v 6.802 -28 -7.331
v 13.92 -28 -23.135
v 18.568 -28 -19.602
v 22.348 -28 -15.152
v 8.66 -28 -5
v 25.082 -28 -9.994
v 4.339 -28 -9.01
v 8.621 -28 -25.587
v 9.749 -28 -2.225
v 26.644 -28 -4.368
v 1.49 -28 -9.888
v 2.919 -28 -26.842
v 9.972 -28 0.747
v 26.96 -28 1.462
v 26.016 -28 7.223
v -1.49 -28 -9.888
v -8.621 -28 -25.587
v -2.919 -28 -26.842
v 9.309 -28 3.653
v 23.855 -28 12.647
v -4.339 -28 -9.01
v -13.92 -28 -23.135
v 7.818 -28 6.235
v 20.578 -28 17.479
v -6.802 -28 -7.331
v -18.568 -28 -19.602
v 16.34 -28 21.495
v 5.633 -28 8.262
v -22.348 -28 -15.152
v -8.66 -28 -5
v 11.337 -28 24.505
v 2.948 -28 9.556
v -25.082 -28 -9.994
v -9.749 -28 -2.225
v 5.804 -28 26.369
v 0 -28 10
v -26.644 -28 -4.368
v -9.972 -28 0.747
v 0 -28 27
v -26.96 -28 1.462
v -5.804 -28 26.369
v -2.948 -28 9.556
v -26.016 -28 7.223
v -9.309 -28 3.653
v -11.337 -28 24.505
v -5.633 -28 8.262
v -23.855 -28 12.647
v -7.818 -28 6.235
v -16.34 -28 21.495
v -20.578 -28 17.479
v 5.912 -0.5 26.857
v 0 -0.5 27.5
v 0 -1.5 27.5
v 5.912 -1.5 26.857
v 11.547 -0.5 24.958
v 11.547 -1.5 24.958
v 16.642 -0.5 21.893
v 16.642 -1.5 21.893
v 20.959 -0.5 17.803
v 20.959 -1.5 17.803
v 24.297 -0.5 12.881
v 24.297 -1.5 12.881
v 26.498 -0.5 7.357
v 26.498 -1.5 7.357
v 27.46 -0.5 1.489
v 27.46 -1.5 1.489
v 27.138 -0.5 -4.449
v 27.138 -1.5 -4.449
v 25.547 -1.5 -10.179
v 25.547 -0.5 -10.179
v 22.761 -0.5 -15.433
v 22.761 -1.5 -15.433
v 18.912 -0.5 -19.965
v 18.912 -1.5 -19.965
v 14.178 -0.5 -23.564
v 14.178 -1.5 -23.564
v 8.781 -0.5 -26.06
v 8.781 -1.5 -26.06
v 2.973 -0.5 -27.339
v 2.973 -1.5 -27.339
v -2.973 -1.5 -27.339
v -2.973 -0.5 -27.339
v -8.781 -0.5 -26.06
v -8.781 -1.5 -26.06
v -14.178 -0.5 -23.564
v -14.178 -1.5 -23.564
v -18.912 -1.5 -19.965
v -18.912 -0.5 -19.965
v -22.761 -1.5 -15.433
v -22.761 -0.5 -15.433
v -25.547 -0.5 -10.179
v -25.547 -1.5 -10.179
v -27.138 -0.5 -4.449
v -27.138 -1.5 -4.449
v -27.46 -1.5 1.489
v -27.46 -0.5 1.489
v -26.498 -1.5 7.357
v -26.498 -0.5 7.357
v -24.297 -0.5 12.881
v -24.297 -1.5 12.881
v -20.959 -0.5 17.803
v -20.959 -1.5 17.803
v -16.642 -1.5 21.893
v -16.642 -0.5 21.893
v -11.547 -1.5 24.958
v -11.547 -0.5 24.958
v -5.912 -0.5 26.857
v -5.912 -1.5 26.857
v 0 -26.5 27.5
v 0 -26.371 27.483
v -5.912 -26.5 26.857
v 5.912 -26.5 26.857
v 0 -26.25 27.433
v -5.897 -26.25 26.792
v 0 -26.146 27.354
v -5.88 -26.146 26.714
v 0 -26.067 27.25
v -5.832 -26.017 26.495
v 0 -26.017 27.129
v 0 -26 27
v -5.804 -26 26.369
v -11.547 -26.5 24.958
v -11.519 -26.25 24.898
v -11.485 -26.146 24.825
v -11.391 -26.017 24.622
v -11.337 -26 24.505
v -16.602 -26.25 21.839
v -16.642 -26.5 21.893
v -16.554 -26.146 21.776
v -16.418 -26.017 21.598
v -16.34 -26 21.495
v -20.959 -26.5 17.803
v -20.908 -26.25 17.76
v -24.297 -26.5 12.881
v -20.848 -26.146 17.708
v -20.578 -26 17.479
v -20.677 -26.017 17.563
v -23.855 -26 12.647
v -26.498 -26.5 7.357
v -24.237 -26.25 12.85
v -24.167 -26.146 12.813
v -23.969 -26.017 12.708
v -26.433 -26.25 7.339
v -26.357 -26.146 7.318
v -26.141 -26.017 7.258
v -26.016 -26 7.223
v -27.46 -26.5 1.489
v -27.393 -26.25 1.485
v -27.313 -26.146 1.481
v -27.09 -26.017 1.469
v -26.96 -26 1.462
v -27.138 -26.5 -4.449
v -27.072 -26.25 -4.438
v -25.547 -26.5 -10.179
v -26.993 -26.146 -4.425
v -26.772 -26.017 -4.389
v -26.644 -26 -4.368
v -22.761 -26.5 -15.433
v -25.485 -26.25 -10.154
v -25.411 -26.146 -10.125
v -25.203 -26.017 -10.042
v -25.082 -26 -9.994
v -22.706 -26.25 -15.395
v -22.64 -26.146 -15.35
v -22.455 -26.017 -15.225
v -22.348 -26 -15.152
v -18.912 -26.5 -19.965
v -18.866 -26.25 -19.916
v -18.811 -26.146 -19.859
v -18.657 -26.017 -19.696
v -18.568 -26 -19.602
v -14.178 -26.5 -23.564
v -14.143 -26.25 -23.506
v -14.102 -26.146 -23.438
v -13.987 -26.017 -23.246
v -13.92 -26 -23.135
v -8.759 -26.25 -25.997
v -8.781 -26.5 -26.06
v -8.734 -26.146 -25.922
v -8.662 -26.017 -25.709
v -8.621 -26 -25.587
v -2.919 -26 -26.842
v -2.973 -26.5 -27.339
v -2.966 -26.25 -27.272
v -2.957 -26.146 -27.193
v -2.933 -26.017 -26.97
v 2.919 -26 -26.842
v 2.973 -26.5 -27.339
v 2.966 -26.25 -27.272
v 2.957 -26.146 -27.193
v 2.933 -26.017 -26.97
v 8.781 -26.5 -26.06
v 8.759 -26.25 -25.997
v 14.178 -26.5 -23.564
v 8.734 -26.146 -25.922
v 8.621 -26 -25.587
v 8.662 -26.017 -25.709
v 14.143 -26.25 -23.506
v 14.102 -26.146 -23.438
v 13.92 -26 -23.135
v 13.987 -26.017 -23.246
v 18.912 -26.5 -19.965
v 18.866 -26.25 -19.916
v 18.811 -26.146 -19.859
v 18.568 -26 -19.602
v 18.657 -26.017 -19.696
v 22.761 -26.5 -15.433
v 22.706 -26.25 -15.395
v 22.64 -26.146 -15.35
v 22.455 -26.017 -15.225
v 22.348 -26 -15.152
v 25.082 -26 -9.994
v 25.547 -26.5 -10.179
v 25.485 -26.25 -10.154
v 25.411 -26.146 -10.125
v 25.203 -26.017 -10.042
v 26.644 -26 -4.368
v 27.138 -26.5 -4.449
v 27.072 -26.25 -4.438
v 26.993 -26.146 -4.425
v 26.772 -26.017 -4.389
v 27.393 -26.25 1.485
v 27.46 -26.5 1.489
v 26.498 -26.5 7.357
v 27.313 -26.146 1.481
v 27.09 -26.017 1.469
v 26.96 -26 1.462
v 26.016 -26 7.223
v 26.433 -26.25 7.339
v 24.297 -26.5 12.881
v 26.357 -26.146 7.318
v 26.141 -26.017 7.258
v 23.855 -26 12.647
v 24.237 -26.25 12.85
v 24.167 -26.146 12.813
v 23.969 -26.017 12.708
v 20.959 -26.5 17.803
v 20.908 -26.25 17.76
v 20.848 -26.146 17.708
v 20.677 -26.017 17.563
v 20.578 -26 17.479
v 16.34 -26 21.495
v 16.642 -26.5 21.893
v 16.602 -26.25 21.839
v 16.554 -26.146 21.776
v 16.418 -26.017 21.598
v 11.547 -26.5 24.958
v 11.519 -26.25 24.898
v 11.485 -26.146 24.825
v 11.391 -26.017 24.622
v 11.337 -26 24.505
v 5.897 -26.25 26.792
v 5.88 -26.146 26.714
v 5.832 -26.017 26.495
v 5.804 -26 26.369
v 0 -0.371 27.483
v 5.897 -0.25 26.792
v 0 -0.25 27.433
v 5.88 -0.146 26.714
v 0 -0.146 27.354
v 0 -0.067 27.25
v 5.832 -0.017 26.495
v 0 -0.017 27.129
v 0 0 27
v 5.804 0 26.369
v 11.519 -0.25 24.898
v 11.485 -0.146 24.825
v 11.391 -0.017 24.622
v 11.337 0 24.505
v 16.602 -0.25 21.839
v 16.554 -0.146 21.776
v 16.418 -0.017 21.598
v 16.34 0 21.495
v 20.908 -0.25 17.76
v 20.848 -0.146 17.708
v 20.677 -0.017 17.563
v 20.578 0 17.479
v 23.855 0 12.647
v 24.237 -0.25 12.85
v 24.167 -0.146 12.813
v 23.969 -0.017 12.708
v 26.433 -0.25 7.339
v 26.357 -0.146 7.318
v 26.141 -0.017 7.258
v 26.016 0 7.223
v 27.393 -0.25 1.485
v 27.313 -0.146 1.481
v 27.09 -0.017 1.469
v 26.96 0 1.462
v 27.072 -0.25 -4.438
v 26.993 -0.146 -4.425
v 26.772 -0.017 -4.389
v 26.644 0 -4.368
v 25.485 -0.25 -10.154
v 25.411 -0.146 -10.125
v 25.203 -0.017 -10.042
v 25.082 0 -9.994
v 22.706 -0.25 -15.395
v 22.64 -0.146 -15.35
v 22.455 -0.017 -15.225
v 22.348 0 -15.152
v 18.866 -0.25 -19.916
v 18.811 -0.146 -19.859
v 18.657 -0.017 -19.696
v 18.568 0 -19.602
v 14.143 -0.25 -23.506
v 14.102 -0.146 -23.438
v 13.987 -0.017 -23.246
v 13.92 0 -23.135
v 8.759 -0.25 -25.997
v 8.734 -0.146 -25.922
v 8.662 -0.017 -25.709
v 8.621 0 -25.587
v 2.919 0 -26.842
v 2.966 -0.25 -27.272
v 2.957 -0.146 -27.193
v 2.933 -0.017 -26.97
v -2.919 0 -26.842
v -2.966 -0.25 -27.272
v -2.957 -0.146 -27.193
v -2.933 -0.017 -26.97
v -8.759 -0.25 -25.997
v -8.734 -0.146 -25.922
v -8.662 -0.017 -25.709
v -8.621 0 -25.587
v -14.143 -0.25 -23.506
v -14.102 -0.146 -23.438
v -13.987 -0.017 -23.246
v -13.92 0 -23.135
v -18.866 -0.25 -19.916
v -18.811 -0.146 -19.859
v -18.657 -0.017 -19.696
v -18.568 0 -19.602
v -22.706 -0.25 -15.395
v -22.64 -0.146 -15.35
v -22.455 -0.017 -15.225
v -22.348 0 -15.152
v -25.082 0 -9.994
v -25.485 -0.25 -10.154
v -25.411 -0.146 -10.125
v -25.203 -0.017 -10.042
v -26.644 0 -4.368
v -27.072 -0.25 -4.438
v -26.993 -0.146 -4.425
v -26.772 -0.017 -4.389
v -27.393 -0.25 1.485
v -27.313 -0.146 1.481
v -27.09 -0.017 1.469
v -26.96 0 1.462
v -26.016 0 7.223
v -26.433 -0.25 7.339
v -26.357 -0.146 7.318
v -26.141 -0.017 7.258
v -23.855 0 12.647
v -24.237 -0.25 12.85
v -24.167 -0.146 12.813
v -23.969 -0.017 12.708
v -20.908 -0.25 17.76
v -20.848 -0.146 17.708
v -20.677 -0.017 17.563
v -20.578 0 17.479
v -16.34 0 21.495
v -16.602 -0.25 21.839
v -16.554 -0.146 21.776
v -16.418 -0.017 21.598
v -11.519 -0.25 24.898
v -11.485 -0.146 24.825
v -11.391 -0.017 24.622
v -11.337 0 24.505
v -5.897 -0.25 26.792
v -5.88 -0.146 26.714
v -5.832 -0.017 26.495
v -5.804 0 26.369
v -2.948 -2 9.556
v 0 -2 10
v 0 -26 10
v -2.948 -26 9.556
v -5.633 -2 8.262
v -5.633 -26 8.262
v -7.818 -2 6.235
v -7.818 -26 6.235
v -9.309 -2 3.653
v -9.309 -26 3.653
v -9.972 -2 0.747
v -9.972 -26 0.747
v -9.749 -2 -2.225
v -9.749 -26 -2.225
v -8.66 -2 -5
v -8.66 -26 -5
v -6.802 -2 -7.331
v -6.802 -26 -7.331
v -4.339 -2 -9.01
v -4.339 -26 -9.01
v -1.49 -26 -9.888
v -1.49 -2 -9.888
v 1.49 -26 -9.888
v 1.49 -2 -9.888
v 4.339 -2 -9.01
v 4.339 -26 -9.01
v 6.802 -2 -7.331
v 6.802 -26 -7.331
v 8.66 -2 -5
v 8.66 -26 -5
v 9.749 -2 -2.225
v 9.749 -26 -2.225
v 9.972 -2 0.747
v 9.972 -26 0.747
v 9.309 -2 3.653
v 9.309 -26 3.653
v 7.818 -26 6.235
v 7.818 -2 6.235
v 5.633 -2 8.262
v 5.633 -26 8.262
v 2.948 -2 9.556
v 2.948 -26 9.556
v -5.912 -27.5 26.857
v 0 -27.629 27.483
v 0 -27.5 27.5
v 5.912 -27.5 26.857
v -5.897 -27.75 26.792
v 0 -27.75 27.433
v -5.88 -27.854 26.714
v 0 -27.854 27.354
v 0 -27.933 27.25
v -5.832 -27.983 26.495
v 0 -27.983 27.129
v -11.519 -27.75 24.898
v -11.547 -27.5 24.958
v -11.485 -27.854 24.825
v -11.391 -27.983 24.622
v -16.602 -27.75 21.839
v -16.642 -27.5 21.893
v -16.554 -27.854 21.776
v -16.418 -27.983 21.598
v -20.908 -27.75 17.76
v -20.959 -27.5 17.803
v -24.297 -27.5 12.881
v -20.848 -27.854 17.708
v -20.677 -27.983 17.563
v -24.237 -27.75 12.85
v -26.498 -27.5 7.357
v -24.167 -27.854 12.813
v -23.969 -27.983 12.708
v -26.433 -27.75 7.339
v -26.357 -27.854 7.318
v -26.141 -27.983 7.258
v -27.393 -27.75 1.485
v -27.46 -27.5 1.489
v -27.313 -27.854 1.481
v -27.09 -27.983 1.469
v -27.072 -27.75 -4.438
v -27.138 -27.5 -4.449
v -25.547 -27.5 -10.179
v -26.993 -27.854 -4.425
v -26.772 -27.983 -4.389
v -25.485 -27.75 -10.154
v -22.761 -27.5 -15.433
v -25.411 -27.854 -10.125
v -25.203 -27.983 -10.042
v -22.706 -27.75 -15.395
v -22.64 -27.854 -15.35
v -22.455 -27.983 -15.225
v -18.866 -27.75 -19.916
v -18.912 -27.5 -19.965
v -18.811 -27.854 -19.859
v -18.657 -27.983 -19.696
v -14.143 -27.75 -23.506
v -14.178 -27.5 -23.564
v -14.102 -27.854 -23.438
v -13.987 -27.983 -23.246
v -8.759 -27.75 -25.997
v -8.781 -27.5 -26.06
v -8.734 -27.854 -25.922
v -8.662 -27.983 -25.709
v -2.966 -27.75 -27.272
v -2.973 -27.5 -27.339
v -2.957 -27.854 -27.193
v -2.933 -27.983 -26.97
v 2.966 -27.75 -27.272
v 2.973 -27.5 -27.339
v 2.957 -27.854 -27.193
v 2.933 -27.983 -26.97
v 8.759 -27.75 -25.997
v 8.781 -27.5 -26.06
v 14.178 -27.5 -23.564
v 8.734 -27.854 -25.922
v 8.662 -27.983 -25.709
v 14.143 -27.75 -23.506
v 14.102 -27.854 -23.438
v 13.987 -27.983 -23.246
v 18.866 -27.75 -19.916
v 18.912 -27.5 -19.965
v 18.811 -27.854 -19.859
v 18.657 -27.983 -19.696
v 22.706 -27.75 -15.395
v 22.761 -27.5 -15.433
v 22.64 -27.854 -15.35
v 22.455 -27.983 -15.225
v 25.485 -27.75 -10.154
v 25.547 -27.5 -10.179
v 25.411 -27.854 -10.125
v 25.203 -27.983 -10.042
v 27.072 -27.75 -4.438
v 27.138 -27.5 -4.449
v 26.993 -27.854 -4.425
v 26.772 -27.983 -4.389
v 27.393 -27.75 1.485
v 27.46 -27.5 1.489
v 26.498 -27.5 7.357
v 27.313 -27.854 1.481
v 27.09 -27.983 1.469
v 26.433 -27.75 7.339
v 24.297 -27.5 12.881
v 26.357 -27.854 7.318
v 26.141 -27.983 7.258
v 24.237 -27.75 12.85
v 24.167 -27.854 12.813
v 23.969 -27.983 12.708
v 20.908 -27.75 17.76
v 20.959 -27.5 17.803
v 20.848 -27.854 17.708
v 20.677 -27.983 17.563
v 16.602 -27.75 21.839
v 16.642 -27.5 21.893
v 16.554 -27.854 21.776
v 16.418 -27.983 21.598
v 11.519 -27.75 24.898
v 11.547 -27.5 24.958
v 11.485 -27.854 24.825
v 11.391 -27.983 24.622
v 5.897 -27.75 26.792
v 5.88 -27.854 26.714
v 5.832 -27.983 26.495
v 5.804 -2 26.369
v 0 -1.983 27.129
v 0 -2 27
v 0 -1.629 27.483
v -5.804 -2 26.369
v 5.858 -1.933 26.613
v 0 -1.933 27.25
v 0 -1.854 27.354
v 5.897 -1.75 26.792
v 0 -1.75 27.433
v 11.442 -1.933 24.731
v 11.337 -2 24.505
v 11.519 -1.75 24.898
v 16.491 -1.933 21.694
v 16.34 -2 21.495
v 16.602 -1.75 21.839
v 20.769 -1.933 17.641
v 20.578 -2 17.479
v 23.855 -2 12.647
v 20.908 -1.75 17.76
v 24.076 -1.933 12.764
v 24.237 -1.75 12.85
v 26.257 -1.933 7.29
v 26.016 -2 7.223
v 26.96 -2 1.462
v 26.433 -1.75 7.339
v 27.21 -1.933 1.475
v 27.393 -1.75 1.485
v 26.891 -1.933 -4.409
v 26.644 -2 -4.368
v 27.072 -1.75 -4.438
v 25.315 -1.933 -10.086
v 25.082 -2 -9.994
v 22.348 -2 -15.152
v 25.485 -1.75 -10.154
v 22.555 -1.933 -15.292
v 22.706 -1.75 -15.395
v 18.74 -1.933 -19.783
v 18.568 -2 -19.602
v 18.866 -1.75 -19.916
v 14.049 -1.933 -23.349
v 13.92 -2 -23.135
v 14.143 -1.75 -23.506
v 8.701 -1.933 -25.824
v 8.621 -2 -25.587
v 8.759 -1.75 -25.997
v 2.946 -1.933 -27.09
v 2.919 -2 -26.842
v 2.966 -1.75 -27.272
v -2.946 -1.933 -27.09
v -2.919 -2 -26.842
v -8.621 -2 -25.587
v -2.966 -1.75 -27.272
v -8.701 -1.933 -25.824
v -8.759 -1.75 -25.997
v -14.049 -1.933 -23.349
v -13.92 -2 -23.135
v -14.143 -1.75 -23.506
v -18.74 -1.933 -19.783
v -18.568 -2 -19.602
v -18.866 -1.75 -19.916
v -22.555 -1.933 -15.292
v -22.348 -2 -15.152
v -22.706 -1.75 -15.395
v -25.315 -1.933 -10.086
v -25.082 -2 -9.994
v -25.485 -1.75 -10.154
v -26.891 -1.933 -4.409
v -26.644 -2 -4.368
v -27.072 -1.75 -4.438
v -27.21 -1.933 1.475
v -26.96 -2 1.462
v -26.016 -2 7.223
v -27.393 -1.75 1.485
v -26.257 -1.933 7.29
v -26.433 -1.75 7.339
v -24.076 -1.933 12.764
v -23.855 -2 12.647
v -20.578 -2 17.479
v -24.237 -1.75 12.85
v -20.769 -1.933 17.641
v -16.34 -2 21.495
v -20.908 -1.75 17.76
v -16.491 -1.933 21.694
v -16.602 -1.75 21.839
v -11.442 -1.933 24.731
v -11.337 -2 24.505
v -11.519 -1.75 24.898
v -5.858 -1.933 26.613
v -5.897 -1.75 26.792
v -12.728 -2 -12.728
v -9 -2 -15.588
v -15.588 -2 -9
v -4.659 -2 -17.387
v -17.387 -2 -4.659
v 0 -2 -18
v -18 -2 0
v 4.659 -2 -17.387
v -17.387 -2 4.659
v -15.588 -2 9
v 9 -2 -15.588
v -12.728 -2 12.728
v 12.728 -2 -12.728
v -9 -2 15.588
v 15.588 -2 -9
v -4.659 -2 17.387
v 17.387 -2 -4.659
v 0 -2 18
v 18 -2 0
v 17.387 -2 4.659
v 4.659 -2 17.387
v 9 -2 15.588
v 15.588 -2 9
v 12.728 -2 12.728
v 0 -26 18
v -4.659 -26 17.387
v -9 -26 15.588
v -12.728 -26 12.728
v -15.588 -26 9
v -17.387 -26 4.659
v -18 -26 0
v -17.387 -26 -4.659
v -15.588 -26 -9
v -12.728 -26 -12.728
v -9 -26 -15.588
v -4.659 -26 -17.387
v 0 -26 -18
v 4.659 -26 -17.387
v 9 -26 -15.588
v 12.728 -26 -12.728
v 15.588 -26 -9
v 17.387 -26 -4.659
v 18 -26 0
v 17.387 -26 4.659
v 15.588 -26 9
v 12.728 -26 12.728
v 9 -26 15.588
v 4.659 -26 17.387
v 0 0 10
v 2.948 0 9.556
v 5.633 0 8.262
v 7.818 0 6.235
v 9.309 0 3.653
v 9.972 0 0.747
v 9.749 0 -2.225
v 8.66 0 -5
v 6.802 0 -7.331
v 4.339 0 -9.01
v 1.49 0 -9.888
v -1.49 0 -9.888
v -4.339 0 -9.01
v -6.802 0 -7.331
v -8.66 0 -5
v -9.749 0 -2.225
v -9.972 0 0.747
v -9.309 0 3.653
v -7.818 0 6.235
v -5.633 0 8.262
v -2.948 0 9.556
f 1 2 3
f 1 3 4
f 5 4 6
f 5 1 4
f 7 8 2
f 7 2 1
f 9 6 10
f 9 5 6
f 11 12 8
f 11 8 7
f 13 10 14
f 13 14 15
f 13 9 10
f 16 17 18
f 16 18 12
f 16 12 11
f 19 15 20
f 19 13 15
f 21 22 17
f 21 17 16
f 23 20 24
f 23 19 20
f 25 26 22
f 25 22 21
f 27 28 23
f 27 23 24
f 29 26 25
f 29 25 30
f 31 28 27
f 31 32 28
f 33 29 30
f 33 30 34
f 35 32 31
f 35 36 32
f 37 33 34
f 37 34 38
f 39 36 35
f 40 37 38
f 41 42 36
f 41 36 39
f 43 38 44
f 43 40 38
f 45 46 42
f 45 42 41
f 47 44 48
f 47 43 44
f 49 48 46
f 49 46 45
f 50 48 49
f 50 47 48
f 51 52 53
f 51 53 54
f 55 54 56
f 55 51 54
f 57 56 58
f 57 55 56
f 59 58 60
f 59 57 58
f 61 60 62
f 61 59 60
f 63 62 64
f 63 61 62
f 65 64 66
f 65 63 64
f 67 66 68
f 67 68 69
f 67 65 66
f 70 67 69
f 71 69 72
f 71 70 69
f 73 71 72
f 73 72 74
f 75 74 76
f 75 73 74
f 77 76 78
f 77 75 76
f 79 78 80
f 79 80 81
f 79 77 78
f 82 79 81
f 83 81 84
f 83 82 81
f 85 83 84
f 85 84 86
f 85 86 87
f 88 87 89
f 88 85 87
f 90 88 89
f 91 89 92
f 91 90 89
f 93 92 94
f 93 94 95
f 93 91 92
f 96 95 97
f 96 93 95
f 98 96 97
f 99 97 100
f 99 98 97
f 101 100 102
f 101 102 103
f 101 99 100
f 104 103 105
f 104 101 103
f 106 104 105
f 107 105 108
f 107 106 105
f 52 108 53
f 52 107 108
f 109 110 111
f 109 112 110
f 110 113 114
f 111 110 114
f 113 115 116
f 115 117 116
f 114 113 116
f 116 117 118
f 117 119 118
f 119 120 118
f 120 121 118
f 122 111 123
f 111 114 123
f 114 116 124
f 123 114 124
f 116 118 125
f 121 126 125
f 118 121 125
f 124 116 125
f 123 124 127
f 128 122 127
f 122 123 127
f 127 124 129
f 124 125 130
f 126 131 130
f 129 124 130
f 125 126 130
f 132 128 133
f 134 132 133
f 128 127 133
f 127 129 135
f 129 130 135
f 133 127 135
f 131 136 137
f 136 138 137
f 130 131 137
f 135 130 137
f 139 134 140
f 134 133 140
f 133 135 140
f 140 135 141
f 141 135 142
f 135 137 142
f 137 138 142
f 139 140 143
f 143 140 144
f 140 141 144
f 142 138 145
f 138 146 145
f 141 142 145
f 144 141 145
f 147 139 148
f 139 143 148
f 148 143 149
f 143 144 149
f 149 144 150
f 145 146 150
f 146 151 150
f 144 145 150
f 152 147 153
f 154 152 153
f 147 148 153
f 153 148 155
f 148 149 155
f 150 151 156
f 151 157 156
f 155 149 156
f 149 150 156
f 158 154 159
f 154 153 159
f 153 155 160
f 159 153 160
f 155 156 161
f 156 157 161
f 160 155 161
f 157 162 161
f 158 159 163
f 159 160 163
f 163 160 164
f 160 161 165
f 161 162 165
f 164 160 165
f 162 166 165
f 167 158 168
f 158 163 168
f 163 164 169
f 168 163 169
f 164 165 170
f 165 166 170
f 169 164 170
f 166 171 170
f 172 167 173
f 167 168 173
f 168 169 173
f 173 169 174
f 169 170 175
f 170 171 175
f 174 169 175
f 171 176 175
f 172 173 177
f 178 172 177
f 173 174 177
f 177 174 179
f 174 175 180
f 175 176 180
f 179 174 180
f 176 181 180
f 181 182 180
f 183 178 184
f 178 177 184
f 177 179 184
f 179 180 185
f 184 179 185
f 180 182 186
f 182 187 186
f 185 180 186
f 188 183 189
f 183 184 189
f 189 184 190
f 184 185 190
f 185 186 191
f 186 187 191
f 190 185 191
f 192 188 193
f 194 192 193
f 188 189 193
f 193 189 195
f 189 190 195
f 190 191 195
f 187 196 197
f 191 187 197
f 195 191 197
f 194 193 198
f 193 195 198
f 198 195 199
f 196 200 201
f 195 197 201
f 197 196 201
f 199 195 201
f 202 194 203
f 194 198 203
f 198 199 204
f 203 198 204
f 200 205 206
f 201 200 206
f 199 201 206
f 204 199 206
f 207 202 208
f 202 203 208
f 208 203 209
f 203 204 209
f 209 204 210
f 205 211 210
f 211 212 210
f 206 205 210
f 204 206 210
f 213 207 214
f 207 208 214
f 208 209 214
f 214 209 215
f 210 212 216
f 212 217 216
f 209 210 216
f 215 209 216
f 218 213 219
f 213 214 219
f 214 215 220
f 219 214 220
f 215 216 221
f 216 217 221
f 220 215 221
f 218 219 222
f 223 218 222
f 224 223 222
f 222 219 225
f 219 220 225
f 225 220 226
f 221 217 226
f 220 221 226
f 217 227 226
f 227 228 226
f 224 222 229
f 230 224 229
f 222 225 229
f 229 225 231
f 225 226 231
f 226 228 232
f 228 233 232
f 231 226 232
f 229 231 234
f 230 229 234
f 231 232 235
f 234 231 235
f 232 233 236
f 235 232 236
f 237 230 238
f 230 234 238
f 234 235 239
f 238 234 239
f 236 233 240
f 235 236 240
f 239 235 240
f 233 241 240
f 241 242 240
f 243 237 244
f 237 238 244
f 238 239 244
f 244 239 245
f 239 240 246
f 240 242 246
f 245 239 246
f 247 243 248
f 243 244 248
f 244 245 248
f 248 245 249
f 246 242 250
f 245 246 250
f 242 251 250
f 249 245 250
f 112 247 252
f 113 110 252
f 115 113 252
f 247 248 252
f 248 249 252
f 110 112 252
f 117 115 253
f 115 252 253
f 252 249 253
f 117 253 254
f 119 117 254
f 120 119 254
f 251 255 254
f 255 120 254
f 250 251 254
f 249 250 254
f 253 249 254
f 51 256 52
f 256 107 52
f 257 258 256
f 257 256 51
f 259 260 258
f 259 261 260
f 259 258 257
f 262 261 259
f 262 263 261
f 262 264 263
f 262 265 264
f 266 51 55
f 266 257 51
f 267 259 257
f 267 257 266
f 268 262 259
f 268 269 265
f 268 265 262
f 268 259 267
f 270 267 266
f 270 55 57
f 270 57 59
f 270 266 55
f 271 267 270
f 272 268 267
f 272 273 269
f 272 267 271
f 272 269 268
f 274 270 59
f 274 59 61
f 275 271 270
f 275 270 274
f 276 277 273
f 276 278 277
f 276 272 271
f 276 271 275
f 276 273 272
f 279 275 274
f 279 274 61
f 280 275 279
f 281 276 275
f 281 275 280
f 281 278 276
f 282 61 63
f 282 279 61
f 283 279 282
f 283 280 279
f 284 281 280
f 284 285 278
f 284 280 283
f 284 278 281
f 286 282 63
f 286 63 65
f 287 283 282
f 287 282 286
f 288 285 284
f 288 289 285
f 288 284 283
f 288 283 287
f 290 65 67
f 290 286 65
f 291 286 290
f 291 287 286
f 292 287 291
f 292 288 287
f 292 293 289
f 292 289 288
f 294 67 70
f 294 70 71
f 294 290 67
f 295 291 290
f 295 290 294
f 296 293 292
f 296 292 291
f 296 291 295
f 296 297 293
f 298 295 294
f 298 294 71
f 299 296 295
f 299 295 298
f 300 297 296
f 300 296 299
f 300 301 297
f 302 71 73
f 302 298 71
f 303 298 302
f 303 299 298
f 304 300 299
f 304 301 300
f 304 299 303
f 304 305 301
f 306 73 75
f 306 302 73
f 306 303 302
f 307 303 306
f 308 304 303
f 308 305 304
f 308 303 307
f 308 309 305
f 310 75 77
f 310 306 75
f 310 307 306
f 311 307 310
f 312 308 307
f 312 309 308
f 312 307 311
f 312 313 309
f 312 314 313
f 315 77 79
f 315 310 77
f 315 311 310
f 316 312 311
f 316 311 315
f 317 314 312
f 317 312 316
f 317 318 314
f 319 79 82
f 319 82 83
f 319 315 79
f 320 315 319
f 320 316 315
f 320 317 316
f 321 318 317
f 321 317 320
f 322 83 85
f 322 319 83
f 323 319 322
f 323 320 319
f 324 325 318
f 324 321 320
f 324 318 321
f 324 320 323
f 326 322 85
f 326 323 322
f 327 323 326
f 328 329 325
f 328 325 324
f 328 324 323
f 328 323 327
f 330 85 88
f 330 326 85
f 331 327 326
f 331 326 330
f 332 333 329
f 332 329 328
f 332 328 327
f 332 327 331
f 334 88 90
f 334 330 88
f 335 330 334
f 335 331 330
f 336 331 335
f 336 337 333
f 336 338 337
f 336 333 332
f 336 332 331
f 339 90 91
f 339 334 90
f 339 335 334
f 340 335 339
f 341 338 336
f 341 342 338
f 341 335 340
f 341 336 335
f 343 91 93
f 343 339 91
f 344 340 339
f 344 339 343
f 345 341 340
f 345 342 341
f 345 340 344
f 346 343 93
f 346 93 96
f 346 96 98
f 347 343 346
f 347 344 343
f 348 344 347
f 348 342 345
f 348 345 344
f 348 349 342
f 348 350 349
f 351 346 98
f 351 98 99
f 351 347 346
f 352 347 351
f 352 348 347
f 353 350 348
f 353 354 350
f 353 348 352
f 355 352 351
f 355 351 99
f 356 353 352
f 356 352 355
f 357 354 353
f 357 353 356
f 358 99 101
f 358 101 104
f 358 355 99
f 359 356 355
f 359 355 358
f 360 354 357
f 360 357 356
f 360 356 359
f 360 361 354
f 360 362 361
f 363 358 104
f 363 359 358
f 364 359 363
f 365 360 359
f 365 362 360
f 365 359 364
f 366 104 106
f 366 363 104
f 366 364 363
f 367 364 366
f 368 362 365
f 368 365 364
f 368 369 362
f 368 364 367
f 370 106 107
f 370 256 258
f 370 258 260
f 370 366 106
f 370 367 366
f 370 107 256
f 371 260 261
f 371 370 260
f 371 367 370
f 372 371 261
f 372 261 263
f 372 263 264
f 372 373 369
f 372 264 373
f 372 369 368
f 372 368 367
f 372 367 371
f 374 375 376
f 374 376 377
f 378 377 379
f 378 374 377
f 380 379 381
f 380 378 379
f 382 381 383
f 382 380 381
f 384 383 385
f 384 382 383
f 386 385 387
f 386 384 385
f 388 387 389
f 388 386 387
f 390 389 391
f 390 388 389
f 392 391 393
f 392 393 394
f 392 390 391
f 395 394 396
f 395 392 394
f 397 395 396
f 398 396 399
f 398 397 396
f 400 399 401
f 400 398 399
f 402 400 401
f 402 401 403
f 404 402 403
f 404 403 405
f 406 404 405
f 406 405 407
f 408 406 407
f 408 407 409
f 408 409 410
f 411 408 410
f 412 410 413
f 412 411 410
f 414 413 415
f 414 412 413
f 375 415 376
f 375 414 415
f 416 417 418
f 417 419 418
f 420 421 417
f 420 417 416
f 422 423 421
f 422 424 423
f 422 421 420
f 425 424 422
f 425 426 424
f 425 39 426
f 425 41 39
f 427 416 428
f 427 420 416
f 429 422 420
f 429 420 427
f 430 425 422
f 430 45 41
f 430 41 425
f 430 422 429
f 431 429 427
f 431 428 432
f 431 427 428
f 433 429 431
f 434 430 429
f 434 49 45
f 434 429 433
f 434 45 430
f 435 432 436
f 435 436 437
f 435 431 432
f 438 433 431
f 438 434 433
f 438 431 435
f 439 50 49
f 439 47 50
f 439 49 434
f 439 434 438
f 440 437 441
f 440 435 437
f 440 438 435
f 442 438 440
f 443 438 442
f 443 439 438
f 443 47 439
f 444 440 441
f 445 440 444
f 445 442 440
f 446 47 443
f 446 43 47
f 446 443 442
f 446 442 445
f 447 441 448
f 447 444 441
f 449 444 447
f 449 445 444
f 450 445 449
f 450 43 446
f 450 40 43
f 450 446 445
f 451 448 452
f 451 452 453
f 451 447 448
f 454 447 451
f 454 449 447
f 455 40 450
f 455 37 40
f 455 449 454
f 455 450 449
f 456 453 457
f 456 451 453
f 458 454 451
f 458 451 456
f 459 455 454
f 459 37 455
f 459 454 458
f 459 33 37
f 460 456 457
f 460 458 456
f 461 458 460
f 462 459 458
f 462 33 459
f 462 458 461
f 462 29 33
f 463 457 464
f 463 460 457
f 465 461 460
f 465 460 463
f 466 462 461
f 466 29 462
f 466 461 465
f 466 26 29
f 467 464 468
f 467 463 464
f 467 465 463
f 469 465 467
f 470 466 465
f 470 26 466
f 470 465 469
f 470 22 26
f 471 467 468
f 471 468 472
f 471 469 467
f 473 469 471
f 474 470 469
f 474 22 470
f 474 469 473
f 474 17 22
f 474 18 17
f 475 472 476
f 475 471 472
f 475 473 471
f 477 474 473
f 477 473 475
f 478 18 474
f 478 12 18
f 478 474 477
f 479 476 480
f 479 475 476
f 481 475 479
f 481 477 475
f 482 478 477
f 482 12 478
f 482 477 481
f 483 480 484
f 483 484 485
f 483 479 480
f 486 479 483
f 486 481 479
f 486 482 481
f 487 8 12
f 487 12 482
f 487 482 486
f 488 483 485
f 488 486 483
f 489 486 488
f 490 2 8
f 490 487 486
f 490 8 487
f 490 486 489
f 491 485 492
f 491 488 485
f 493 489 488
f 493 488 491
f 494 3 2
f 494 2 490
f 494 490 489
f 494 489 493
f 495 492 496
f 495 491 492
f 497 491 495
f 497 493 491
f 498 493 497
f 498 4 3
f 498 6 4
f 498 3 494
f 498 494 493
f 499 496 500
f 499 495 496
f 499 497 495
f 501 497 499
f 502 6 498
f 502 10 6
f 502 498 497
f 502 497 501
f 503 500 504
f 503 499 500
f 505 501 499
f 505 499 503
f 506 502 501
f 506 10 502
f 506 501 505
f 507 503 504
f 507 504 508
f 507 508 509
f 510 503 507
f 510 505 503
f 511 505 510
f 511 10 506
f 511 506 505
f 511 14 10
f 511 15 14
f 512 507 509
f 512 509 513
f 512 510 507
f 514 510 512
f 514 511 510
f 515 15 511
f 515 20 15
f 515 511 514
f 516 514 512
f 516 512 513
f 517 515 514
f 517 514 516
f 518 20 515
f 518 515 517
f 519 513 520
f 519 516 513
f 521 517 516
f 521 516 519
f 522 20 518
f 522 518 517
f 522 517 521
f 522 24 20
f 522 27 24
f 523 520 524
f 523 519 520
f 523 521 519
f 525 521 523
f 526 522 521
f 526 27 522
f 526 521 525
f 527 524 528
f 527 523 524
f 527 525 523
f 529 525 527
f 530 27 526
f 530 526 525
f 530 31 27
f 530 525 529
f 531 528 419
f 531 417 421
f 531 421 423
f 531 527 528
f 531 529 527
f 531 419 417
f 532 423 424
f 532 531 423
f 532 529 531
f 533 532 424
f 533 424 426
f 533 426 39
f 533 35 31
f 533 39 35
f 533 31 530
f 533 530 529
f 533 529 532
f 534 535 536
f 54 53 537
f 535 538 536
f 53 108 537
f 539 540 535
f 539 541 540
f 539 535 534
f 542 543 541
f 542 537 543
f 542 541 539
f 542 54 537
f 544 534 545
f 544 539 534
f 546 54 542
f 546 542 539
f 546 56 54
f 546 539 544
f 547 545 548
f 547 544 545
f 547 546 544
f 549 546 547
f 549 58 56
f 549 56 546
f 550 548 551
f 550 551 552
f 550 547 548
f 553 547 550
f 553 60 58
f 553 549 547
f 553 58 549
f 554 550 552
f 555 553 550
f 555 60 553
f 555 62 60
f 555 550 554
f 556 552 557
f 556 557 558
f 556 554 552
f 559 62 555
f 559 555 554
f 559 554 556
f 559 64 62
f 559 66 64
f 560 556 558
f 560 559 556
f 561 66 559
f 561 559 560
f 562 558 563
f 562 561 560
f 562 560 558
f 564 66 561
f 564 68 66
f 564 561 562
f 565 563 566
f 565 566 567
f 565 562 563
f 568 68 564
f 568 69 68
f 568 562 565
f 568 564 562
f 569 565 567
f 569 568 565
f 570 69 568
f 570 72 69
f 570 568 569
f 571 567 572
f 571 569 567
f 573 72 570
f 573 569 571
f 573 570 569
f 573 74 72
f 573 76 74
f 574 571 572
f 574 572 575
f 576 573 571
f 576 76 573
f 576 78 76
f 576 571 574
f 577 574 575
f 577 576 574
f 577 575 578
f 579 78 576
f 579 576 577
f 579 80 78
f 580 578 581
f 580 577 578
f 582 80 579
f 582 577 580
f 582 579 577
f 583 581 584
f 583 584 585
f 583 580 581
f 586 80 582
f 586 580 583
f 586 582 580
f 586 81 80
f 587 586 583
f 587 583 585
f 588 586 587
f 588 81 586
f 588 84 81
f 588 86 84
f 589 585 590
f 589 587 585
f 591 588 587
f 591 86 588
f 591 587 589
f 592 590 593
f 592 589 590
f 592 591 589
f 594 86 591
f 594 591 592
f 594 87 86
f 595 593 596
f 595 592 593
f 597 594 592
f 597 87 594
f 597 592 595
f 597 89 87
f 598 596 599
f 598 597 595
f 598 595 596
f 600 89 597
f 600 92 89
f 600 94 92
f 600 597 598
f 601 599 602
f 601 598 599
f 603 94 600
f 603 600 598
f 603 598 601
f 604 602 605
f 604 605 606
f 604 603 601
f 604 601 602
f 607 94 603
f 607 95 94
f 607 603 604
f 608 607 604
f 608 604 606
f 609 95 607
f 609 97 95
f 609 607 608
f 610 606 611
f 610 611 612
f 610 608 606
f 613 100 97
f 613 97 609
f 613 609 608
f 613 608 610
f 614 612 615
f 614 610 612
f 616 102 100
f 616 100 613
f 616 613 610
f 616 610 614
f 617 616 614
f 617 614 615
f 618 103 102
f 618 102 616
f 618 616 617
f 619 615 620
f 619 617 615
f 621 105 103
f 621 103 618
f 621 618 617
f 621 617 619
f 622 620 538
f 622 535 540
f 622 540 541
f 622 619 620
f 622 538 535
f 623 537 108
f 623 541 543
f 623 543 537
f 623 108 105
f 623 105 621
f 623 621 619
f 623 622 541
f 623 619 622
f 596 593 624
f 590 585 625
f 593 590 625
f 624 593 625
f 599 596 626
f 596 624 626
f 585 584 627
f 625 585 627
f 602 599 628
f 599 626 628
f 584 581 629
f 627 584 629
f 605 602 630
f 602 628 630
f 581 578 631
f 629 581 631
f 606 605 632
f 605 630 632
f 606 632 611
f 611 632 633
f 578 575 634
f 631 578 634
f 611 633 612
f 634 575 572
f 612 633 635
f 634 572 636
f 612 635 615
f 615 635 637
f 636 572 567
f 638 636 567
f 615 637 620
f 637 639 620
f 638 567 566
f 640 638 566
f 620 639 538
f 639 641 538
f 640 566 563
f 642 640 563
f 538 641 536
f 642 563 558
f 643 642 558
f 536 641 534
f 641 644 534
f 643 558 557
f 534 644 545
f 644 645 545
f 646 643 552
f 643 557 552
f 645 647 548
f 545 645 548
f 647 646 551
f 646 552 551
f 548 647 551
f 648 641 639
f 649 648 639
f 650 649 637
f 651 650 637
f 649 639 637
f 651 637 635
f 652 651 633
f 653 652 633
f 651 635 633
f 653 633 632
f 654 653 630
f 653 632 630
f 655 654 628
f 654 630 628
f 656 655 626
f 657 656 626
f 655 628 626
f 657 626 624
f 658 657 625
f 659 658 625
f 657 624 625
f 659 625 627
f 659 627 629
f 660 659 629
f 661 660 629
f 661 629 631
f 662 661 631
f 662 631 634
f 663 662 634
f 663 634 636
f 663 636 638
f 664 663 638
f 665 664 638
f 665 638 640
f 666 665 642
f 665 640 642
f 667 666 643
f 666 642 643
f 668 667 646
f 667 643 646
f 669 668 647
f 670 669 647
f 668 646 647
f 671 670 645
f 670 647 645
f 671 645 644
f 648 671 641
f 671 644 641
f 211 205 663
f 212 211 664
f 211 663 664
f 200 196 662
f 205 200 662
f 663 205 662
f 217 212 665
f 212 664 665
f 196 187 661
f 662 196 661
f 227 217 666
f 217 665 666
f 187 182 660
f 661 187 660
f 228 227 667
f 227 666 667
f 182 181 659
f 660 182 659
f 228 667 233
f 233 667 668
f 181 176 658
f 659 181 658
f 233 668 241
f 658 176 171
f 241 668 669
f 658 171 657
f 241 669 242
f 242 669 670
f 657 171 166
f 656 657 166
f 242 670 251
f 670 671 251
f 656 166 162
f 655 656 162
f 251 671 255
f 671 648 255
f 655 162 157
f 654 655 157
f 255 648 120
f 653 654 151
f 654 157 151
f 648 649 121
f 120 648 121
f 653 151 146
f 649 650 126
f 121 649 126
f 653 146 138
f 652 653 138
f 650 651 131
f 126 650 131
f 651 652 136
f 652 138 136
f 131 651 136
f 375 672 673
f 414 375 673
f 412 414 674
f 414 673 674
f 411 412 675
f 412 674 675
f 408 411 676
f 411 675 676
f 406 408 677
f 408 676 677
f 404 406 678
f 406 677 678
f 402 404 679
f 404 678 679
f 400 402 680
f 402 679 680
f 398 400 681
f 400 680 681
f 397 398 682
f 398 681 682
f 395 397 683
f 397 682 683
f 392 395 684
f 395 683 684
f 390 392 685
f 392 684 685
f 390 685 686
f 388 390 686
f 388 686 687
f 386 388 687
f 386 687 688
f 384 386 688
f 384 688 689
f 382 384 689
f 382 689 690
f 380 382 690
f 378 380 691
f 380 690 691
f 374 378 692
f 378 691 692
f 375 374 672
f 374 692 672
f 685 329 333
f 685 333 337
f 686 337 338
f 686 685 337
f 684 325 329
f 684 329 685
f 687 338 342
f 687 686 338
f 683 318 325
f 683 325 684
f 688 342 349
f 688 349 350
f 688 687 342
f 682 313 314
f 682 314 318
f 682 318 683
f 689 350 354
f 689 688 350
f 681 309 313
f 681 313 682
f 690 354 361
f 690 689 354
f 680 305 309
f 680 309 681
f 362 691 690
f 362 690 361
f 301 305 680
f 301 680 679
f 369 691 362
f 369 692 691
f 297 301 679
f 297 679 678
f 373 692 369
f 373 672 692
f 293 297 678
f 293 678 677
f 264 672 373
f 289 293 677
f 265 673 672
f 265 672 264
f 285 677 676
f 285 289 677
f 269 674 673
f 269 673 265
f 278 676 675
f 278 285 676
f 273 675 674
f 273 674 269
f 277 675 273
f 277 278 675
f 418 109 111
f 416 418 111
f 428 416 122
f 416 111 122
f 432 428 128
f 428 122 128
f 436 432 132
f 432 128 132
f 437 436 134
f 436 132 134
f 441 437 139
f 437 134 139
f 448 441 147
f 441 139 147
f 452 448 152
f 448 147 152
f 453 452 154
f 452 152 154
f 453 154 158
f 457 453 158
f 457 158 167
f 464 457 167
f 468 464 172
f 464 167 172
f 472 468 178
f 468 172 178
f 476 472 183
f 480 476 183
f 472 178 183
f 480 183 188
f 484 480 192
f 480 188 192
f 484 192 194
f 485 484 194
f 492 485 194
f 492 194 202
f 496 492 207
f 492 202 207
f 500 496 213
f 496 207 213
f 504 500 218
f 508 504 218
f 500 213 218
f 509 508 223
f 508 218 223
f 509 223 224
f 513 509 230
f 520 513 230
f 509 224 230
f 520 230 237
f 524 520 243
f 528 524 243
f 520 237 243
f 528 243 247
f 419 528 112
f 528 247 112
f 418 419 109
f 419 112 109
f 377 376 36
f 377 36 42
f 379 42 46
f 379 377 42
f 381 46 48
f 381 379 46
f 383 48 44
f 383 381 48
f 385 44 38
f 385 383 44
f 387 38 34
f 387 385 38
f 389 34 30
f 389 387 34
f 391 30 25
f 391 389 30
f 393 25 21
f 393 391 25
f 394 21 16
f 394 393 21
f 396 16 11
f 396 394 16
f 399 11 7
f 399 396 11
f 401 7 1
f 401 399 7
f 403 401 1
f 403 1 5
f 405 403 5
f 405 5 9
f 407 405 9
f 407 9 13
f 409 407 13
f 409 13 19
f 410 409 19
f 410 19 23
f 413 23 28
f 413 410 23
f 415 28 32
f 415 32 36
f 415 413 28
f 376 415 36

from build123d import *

# Parameters (mm, degrees)
SKETCH_1_R      = 27.5
SKETCH_1_R_2    = 10
EXTRUDE_1_DEPTH = 2
SKETCH_2_R      = 18
SKETCH_2_R_2    = 10
EXTRUDE_2_DEPTH = 24
SKETCH_3_R      = 27.5
SKETCH_3_R_2    = 10
EXTRUDE_3_DEPTH = 2
FILLET_1_R      = 0.5


with BuildPart() as part:
    # 草图1 → 凸台-拉伸1 (new body)
    with BuildSketch(Plane(origin=(0, 0, 0), x_dir=(1, 0, 0), z_dir=(0, 1, 0))):
        with Locations(Location((0, 0, 0), (0, 0, 270))):
            Circle(SKETCH_1_R)
        with Locations(Location((0, 0, 0), (0, 0, 270))):
            Circle(SKETCH_1_R_2, mode=Mode.SUBTRACT)
    extrude(amount=-EXTRUDE_1_DEPTH)

    # 草图2 → 凸台-拉伸2 (add)
    with BuildSketch(Plane.XZ.offset(2)):
        with Locations(Location((0, 0, 0), (0, 0, 90))):
            Circle(SKETCH_2_R)
        with Locations(Location((0, 0, 0), (0, 0, 90))):
            Circle(SKETCH_2_R_2, mode=Mode.SUBTRACT)
    extrude(amount=EXTRUDE_2_DEPTH)

    # 草图3 → 凸台-拉伸3 (add)
    with BuildSketch(Plane.XZ.offset(26)):
        with Locations(Location((0, 0, 0), (0, 0, 90))):
            Circle(SKETCH_3_R)
        with Locations(Location((0, 0, 0), (0, 0, 90))):
            Circle(SKETCH_3_R_2, mode=Mode.SUBTRACT)
    extrude(amount=EXTRUDE_3_DEPTH)

    # 圆角1
    fillet_1_edges = [part.edges().sort_by_distance(p)[0] for p in [
        (0, -28, -27.5),
        (0, -26, -27.5),
        (0, 0, -27.5),
        (0, -2, -27.5),
    ]]
    fillet(fillet_1_edges, radius=FILLET_1_R)


solid = part.part
